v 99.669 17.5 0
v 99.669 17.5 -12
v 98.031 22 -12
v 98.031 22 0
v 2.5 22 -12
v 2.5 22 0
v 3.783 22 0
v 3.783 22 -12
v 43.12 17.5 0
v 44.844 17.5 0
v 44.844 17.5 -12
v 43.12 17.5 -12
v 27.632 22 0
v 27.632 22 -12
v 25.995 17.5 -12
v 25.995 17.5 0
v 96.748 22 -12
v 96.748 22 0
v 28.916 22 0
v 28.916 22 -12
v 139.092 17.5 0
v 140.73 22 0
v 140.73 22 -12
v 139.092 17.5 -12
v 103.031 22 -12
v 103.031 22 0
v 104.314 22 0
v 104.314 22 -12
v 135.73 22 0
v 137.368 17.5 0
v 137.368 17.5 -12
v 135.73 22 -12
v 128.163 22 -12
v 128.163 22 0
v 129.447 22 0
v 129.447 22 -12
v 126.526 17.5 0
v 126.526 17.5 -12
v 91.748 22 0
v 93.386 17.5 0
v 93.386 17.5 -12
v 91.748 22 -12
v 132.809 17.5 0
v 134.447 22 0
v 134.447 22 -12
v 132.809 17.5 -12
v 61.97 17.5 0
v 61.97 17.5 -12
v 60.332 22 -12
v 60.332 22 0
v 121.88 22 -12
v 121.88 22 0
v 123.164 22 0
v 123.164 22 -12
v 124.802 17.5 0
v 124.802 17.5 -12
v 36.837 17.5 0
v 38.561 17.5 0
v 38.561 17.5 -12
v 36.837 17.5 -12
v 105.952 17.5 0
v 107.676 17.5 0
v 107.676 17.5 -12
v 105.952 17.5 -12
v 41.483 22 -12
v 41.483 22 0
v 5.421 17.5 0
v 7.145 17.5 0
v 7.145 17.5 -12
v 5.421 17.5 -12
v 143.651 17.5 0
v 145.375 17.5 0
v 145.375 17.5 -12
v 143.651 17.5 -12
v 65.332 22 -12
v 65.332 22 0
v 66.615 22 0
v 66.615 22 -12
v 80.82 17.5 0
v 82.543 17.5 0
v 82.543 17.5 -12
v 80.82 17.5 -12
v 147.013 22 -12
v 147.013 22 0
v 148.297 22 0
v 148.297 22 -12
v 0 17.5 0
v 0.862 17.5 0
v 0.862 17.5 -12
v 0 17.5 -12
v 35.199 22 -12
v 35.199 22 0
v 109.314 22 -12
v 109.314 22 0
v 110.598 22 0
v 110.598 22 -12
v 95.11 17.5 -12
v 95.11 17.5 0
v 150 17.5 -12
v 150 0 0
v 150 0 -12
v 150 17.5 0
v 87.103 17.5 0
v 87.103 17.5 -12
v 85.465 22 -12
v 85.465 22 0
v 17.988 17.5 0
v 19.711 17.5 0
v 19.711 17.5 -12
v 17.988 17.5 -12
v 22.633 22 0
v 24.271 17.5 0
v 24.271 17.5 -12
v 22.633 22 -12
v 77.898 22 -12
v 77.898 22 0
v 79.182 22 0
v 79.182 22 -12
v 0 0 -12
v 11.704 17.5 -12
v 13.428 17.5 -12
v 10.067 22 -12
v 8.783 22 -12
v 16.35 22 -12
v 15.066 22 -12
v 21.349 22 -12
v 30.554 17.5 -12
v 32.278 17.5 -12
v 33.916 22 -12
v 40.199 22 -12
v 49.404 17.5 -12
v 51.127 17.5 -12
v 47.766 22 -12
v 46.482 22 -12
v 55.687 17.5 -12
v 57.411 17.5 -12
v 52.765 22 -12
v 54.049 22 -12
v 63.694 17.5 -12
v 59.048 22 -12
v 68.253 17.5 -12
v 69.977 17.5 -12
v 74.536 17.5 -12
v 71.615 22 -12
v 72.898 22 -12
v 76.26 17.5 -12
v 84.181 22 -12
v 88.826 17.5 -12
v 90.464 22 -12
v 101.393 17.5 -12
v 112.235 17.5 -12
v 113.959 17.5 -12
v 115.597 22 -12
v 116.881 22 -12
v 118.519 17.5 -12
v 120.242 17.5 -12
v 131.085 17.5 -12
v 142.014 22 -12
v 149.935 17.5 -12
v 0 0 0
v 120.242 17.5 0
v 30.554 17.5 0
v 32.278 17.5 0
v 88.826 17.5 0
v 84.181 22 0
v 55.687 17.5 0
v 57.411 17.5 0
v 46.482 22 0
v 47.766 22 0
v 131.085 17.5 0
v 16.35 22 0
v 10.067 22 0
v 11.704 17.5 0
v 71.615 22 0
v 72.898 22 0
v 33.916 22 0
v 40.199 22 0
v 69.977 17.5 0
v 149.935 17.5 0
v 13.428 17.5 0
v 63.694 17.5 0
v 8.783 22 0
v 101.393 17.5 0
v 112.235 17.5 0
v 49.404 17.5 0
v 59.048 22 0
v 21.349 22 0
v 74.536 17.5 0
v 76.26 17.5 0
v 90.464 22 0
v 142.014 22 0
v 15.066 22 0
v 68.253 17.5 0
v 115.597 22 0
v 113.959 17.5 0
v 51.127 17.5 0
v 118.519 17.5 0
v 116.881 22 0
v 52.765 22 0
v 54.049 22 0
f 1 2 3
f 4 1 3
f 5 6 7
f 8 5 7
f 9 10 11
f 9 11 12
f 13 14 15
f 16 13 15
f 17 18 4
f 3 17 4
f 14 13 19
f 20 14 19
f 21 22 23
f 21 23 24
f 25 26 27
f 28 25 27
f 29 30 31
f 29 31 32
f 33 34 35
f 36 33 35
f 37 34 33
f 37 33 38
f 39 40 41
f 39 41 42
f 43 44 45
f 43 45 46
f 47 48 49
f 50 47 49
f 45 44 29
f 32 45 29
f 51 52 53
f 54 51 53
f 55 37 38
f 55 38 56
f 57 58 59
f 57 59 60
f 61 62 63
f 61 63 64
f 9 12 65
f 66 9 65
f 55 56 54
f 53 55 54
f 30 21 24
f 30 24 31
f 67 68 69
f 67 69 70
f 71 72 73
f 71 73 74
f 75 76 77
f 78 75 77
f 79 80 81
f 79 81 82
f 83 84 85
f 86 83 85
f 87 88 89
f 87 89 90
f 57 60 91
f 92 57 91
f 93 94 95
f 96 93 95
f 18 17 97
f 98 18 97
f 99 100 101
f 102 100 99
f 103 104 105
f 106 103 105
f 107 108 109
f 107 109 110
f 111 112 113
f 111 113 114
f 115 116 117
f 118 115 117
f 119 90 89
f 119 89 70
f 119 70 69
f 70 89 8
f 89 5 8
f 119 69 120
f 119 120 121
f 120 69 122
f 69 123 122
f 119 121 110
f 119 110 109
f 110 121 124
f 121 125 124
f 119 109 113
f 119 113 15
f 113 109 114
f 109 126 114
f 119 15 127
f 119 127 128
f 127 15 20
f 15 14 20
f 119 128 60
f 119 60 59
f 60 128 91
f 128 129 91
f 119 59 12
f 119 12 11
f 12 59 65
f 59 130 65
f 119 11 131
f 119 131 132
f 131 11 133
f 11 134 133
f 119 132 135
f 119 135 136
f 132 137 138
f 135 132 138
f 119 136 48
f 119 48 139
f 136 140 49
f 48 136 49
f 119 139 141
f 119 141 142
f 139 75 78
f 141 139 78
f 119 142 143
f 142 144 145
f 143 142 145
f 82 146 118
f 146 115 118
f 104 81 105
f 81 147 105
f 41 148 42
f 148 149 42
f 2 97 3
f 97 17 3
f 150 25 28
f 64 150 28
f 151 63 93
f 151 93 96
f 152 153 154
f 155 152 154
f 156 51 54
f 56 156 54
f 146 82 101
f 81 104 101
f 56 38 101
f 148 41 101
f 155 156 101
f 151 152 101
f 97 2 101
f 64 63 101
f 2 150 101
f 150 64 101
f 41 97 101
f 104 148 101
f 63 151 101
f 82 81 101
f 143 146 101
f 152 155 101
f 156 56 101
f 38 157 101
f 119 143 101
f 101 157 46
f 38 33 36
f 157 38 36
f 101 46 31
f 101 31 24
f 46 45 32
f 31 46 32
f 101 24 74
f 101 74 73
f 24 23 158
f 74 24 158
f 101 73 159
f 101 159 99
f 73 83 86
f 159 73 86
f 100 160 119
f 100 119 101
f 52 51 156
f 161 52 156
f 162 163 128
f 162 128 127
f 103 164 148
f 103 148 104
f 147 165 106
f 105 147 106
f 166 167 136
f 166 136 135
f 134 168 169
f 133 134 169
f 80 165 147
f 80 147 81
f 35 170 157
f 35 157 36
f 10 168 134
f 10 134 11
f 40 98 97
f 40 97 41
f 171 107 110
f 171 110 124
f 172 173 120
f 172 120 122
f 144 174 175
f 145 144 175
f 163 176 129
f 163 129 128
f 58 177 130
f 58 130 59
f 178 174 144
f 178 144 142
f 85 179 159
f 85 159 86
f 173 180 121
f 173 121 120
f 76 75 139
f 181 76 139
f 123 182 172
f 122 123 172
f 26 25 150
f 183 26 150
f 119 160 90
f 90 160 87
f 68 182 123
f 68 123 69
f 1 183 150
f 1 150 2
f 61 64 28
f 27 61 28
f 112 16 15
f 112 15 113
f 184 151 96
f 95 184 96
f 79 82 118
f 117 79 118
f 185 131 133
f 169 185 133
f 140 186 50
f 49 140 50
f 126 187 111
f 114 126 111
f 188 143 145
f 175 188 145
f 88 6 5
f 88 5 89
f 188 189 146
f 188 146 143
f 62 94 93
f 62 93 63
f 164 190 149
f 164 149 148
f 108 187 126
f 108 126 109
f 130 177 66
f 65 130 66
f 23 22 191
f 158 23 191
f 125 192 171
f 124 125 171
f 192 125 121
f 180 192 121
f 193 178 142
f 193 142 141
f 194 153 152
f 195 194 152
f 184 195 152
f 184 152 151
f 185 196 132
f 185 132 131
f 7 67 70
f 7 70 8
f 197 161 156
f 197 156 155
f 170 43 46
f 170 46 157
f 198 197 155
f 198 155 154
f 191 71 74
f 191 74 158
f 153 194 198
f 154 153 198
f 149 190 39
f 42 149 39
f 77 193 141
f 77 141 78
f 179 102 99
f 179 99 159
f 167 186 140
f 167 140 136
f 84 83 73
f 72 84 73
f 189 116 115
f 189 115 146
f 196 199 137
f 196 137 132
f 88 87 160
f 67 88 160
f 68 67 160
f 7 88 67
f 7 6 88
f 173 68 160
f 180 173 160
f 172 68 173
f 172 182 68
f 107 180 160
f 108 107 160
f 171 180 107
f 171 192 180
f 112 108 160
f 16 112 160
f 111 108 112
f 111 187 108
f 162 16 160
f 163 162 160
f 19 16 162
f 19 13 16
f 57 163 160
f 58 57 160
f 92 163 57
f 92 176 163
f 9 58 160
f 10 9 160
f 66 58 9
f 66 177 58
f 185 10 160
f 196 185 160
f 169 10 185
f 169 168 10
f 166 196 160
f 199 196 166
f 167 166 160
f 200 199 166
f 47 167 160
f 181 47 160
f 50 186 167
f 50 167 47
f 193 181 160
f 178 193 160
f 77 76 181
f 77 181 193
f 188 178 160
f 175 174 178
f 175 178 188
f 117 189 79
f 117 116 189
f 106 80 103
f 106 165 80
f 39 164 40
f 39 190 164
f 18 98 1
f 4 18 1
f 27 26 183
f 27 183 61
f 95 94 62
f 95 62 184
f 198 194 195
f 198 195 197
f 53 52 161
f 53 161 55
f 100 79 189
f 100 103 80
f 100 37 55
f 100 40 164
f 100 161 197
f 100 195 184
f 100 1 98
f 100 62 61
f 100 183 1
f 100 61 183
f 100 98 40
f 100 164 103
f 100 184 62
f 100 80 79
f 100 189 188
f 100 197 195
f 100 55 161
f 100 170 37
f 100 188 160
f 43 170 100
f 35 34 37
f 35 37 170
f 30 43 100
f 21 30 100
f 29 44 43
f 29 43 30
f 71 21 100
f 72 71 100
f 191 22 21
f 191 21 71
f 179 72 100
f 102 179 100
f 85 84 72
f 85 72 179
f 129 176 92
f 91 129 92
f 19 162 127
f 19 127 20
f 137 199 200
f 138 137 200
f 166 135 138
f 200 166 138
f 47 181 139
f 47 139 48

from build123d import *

# Parameters (mm, degrees)
BLANKSKE_W        = 150
BLANKSKE_H        = 22
BLANK_DEPTH       = 12
TOOTHCUTSIM_DEPTH = 153.078926877
TEETHCUTS_COUNT   = 25
TEETHCUTS_PITCH   = 6.2831853


with BuildPart() as part:
    # BlankSke → Blank (new body)
    with BuildSketch(Plane.XY):
        with Locations((75, 11)):
            Rectangle(BLANKSKE_W, BLANKSKE_H)
    extrude(amount=-BLANK_DEPTH)

    # TooCutSkeSim → ToothCutSim (cut, through all)
    with BuildSketch(Plane.XY):
        Polygon((0.861870739, 17.5), (-0.861870739, 17.5), (-2.508981637, 22.0254), (2.508981637, 22.0254), align=None)
    toothcutsim = extrude(amount=-TOOTHCUTSIM_DEPTH, mode=Mode.SUBTRACT)

    # TeethCuts: ToothCutSim ×25
    with Locations(*[(i * TEETHCUTS_PITCH, 0, 0) for i in range(1, TEETHCUTS_COUNT)]):
        add(toothcutsim, mode=Mode.SUBTRACT)


solid = part.part
